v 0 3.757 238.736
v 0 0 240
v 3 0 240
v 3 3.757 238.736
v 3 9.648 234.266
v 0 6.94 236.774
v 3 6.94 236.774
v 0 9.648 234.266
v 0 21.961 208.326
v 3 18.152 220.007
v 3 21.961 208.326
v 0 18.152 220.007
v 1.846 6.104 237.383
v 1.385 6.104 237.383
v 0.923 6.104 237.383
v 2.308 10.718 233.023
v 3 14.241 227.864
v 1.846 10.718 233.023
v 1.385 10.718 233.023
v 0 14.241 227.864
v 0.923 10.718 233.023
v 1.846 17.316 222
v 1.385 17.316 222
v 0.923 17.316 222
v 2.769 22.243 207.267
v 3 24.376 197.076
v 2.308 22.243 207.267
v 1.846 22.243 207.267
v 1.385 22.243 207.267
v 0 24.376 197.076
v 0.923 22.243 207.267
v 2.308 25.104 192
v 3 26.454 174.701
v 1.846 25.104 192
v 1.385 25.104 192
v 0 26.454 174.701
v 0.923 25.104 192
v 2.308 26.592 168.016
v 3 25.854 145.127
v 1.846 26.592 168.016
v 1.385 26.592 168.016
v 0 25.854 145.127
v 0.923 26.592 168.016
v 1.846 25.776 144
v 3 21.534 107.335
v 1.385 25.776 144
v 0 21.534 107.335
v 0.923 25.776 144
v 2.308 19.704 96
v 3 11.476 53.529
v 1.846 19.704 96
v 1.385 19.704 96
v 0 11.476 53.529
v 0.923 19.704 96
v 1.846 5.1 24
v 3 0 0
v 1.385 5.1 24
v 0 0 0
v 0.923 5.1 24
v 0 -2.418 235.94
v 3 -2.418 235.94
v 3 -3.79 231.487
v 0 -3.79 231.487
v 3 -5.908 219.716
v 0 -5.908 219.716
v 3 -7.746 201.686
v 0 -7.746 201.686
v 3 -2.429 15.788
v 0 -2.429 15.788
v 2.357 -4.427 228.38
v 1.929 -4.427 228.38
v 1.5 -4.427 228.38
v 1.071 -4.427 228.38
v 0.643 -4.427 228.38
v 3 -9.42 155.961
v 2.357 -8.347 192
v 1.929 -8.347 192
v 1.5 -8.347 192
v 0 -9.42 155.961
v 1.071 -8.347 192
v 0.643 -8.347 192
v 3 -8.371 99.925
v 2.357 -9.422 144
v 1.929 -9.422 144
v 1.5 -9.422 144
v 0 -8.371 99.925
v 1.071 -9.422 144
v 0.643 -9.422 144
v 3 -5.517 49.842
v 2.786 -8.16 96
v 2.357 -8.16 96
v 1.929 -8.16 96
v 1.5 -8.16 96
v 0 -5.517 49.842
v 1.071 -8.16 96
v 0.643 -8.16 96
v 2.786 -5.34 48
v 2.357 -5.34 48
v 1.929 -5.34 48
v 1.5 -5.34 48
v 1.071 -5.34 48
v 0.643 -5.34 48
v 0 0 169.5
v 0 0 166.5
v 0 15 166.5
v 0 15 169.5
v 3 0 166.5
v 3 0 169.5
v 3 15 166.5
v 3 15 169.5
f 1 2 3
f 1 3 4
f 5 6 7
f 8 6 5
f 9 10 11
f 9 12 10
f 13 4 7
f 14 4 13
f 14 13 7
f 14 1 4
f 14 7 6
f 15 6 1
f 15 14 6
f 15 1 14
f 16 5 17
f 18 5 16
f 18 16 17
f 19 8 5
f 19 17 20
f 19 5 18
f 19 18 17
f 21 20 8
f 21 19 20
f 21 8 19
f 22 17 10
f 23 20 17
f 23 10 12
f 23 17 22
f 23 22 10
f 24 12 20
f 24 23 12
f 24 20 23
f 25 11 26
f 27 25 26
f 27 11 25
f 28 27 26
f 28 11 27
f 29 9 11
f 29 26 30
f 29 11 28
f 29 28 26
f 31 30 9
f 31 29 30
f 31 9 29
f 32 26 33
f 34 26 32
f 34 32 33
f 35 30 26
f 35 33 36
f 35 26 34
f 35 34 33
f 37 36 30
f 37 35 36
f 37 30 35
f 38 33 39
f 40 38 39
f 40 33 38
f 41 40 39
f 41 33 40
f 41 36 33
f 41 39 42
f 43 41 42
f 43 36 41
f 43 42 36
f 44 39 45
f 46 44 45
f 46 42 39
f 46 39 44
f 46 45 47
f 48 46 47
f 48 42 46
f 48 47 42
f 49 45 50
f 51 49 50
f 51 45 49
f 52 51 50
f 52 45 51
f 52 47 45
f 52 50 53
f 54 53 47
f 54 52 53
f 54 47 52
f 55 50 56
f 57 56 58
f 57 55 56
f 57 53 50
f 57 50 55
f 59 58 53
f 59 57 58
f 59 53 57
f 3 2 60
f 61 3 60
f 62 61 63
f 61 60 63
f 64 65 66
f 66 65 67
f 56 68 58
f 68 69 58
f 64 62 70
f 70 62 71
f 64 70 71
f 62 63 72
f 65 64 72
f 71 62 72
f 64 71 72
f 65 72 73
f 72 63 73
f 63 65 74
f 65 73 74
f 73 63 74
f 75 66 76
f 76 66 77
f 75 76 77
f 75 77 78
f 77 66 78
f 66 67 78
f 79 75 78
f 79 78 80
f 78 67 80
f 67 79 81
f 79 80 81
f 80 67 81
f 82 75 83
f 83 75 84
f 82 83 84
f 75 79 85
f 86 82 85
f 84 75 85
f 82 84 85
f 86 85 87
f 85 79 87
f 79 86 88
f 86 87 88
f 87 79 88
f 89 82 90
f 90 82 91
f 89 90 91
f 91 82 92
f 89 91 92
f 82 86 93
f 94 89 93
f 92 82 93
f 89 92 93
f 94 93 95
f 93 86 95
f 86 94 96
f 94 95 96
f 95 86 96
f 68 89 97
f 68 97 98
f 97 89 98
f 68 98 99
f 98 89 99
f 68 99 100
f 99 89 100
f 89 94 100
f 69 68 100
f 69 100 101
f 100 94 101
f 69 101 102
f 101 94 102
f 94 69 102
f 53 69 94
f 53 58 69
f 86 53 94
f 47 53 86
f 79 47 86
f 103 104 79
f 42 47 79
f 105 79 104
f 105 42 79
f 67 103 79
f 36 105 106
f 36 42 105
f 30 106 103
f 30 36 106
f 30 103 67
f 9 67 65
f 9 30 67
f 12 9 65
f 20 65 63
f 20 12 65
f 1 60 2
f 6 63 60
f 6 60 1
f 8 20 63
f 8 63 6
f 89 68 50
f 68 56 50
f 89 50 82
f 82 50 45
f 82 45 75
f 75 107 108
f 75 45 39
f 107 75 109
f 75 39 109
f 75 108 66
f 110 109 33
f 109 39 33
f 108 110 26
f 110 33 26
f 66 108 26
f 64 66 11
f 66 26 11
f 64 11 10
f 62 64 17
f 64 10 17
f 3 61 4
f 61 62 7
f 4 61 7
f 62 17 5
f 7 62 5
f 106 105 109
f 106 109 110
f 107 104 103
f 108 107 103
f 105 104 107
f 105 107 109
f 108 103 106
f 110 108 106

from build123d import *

# Parameters (mm, degrees)
EXTRUDE_1_DEPTH     = 3
SKETCH_2_W          = 3
SKETCH_2_H          = 15
CUT_EXTRUDE_1_DEPTH = 3


with BuildPart() as part:
    # Эскиз1 → Бобышка-Вытянуть1 (new body)
    with BuildSketch(Plane(origin=(0, 0, 0), x_dir=(0, 0, -1), z_dir=(1, 0, 0))):
        with BuildLine():
            add(Edge.make_bspline(
                [(-240, 0), (-238.539586148, 6.885975956), (-231.6119689, 12.33782744), (-222.175332595, 17.412091216), (-214.111867769, 20.343482826), (-204.156129061, 23.263904239), (-188.104616678, 25.89332168), (-168.007150597, 26.960143982), (-143.945589986, 26.026388226), (-119.918298994, 23.567750867), (-95.953760008, 19.758812003), (-71.912657951, 15.561977026), (-48.005978392, 10.220578603), (-23.989791717, 5.171383231), (-8.037469261, 1.523600682), (0, 0)],
                knots=[0, 0, 0, 0, 0.075346011, 0.102327605, 0.127890212, 0.177564304, 0.226024831, 0.321726685, 0.417300323, 0.513304723, 0.609920295, 0.706973803, 0.804635001, 0.902346226, 1, 1, 1, 1], degree=3))
            add(Edge.make_bspline(
                [(-240, 0), (-236.52391179, -2.886637123), (-230.220810861, -4.067786061), (-222.028601874, -5.648779907), (-214.009642515, -6.608514015), (-204.019456847, -7.65058139), (-188.010543644, -8.621004369), (-168.008371033, -9.355028053), (-143.997445941, -9.544655848), (-119.996434598, -9.000571646), (-95.984120714, -8.452313319), (-79.444451482, -6.861549256), (-63.412851028, -6.941357818), (-47.421480018, -5.149296578), (-23.951991061, -3.34616289), (-7.916011456, -1.672238148), (0, 0)],
                knots=[0, 0, 0, 0, 0.053475274, 0.07870931, 0.103753204, 0.153672751, 0.203448049, 0.302856431, 0.40219897, 0.501554025, 0.600954522, 0.700430481, 0.707480416, 0.799996455, 0.899715685, 1, 1, 1, 1], degree=3))
        make_face()
    extrude(amount=EXTRUDE_1_DEPTH)

    # Эскиз2 → Вырез-Вытянуть1 (cut)
    with BuildSketch(Plane.ZY):
        with Locations((168, 7.5)):
            Rectangle(SKETCH_2_W, SKETCH_2_H)
    extrude(amount=-CUT_EXTRUDE_1_DEPTH, mode=Mode.SUBTRACT)


solid = part.part
